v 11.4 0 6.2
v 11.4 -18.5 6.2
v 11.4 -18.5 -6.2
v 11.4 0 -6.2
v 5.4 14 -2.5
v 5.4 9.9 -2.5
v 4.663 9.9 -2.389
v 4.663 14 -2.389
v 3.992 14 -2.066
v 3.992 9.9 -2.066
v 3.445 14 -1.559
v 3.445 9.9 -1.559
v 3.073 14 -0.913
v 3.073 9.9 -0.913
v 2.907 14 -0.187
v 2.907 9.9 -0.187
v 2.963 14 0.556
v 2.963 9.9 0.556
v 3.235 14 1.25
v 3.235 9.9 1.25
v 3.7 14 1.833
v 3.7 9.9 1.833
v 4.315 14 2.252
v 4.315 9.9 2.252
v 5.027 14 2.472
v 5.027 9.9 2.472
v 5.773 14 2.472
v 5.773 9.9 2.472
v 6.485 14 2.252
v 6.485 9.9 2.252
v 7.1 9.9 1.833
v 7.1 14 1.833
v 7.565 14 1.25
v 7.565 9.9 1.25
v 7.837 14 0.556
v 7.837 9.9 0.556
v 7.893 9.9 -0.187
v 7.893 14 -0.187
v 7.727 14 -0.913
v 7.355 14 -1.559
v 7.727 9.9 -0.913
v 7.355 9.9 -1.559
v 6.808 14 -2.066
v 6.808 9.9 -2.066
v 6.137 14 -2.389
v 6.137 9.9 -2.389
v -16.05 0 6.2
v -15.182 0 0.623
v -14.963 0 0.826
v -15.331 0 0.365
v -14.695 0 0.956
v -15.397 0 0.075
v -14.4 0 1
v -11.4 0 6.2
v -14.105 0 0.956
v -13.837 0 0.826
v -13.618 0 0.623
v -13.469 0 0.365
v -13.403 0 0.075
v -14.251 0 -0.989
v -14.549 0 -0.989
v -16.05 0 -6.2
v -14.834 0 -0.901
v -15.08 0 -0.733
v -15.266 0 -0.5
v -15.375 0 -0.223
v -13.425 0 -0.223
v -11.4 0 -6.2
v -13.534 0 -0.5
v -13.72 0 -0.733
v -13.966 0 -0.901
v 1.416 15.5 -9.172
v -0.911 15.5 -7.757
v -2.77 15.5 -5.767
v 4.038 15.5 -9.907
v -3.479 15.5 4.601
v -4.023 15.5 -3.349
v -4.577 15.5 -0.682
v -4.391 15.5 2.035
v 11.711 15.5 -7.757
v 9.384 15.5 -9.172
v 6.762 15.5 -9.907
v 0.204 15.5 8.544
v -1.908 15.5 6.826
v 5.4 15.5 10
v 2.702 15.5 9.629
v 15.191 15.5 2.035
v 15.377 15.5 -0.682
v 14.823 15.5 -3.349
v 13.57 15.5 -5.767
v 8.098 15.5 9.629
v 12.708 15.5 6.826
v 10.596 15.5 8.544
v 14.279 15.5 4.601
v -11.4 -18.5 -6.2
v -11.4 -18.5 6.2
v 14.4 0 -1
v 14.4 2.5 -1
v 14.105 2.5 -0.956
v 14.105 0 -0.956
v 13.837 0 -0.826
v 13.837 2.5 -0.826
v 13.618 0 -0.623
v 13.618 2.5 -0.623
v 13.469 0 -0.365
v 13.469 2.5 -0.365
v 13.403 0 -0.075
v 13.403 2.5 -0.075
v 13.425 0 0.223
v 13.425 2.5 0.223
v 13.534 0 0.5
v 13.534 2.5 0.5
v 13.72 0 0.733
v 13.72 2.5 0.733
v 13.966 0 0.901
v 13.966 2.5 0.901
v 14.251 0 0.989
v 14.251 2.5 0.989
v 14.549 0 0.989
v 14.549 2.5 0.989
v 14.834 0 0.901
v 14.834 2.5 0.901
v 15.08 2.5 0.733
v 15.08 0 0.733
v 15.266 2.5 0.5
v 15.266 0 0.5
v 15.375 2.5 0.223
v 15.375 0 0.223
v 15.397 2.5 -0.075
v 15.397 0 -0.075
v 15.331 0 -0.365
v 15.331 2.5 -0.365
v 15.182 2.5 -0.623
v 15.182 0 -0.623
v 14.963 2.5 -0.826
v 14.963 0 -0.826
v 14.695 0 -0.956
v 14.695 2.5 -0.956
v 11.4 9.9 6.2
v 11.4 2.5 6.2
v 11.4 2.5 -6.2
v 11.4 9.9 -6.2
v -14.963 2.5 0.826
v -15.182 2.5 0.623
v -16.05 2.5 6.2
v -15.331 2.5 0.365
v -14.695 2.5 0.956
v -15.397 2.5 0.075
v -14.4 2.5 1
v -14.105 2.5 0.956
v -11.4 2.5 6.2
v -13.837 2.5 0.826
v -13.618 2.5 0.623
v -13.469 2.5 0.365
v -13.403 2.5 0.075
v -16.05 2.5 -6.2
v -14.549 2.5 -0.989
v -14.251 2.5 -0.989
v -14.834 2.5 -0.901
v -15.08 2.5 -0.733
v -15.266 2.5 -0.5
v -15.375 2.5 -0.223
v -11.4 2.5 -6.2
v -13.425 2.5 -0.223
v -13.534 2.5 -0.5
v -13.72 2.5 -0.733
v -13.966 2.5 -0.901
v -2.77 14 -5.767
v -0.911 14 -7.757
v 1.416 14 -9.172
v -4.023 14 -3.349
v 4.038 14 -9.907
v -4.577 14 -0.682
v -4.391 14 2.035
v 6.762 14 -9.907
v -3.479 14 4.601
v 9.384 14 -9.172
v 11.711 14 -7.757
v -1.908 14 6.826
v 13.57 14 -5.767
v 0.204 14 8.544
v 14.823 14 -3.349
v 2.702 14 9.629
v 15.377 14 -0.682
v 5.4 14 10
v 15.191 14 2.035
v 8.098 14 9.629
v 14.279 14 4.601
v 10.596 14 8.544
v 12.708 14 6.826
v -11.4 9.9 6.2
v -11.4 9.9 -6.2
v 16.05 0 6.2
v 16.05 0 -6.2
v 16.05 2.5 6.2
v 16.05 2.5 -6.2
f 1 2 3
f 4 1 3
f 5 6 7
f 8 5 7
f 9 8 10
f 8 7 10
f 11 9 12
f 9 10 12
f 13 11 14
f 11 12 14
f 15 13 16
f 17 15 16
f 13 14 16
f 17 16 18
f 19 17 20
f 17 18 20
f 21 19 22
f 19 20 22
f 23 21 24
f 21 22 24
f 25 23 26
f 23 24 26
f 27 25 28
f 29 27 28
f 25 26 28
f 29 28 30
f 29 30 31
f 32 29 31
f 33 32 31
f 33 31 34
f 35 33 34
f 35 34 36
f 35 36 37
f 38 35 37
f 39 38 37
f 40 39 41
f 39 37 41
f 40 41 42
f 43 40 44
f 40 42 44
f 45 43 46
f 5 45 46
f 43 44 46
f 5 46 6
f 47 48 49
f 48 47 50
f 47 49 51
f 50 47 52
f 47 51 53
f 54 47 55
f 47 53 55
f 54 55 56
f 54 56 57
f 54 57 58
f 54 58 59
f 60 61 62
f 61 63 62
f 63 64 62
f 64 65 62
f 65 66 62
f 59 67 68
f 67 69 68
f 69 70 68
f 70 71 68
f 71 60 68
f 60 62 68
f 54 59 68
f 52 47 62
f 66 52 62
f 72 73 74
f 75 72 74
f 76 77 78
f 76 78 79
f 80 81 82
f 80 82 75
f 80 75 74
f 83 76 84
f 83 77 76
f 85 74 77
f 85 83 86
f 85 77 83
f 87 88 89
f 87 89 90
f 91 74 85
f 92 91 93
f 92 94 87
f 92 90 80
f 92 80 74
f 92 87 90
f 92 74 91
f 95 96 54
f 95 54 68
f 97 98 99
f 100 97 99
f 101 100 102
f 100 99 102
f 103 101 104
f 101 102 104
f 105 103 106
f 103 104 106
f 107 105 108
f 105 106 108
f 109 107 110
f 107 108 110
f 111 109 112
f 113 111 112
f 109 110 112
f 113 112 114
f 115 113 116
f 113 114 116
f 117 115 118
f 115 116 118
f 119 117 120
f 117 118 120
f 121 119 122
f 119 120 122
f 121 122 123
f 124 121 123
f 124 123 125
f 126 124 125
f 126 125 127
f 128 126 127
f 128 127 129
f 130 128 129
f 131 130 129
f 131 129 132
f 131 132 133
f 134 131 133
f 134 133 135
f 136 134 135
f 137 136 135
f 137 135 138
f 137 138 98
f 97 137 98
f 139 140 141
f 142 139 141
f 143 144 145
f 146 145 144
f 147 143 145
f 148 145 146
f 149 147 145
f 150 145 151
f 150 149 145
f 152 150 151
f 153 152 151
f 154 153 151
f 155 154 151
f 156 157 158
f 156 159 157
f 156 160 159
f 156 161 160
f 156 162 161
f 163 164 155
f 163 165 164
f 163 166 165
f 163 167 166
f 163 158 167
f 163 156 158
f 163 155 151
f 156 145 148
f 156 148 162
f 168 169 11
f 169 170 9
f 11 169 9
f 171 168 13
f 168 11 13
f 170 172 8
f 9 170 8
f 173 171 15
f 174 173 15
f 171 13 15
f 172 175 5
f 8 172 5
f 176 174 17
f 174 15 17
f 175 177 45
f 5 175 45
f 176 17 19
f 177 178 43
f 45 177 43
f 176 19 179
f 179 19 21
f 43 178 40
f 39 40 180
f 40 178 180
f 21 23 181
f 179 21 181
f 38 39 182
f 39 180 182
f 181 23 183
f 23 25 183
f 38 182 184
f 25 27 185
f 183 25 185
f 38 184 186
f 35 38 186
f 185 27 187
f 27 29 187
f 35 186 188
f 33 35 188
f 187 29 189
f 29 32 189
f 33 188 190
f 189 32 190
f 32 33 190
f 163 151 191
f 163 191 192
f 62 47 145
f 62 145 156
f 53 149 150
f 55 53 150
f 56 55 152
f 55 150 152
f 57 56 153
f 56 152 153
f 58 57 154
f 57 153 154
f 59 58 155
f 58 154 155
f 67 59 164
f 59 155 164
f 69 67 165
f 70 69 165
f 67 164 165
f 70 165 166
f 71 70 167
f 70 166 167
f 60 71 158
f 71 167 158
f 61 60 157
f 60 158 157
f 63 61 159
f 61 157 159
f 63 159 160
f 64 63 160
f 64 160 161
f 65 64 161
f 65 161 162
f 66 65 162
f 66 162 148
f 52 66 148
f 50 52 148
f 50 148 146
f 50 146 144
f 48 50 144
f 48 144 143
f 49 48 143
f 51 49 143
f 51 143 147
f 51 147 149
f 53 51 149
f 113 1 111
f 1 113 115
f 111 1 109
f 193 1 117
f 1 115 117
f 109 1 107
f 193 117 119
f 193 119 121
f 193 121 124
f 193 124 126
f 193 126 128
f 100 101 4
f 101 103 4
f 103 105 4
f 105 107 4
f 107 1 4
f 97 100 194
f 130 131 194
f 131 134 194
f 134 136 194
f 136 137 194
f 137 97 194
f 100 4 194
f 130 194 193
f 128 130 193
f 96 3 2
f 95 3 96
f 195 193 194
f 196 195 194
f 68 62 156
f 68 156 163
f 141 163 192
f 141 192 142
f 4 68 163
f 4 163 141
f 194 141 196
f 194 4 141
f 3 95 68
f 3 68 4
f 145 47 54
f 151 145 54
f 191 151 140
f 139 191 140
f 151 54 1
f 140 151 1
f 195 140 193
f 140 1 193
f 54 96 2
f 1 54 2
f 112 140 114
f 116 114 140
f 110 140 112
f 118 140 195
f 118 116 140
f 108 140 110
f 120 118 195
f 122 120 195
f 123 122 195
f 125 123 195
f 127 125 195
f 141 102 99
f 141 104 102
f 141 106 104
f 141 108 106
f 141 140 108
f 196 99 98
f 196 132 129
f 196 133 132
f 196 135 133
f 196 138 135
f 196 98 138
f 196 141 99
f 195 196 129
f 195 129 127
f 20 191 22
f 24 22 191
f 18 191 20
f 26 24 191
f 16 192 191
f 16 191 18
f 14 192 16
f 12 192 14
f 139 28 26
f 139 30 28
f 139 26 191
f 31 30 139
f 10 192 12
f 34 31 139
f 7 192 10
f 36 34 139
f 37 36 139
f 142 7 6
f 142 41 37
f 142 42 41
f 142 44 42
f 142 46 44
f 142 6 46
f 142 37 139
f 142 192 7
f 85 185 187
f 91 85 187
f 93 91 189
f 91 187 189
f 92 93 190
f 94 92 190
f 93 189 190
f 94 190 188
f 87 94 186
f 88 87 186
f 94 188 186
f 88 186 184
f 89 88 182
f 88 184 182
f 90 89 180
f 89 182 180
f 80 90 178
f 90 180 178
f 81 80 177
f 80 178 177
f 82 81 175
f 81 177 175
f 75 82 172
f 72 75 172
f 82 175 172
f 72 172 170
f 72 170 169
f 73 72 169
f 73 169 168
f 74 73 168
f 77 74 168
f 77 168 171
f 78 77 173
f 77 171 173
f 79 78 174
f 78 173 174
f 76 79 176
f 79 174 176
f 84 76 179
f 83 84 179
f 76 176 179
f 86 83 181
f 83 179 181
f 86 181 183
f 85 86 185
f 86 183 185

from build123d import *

# Parameters (mm, degrees)
SKETCH2_W           = 32.1
SKETCH2_H           = 12.4
BOSS_EXTRUDE1_DEPTH = 2.5
SKETCH3_W           = 22.8
SKETCH3_H           = 12.4
BOSS_EXTRUDE2_DEPTH = 18.5
SKETCH4_W           = 22.8
SKETCH4_H           = 12.4
BOSS_EXTRUDE3_DEPTH = 7.4
SKETCH5_R           = 2.5
BOSS_EXTRUDE4_DEPTH = 4.1
SKETCH6_R           = 1
CUT_EXTRUDE1_DEPTH  = 28.148526664
SKETCH7_R           = 10
BOSS_EXTRUDE5_DEPTH = 1.5


with BuildPart() as part:
    # Sketch2 → Boss-Extrude1 (new body)
    with BuildSketch(Plane(origin=(0, 0, 0), x_dir=(1, 0, 0), z_dir=(0, 1, 0))):
        Rectangle(SKETCH2_W, SKETCH2_H)
    extrude(amount=BOSS_EXTRUDE1_DEPTH)

    # Sketch3 → Boss-Extrude2 (add)
    with BuildSketch(Plane(origin=(0, 0, 0), x_dir=(-1, 0, 0), z_dir=(0, -1, 0))):
        Rectangle(SKETCH3_W, SKETCH3_H)
    extrude(amount=BOSS_EXTRUDE2_DEPTH)

    # Sketch4 → Boss-Extrude3 (add)
    with BuildSketch(Plane(origin=(0, 2.5, 0), x_dir=(1, 0, 0), z_dir=(0, 1, 0))):
        Rectangle(SKETCH4_W, SKETCH4_H)
    extrude(amount=BOSS_EXTRUDE3_DEPTH)

    # Sketch5 → Boss-Extrude4 (add)
    with BuildSketch(Plane(origin=(0, 9.9, 0), x_dir=(1, 0, 0), z_dir=(0, 1, 0))):
        with Locations(Location((5.4, 0, 0), (0, 0, 90))):
            Circle(SKETCH5_R)
    extrude(amount=BOSS_EXTRUDE4_DEPTH)

    # Sketch6 → Cut-Extrude1 (cut, through all)
    with BuildSketch(Plane(origin=(0, 2.5, 0), x_dir=(1, 0, 0), z_dir=(0, 1, 0))):
        with Locations(Location((-14.4, 0, 0), (0, 0, 270))):
            Circle(SKETCH6_R)
        with Locations(Location((14.4, 0, 0), (0, 0, 90))):
            Circle(SKETCH6_R)
    extrude(amount=-CUT_EXTRUDE1_DEPTH, mode=Mode.SUBTRACT)

    # Sketch7 → Boss-Extrude5 (add)
    with BuildSketch(Plane(origin=(0, 14, 0), x_dir=(1, 0, 0), z_dir=(0, 1, 0))):
        with Locations(Location((5.4, 0, 0), (0, 0, 270))):
            Circle(SKETCH7_R)
    extrude(amount=BOSS_EXTRUDE5_DEPTH)


solid = part.part
